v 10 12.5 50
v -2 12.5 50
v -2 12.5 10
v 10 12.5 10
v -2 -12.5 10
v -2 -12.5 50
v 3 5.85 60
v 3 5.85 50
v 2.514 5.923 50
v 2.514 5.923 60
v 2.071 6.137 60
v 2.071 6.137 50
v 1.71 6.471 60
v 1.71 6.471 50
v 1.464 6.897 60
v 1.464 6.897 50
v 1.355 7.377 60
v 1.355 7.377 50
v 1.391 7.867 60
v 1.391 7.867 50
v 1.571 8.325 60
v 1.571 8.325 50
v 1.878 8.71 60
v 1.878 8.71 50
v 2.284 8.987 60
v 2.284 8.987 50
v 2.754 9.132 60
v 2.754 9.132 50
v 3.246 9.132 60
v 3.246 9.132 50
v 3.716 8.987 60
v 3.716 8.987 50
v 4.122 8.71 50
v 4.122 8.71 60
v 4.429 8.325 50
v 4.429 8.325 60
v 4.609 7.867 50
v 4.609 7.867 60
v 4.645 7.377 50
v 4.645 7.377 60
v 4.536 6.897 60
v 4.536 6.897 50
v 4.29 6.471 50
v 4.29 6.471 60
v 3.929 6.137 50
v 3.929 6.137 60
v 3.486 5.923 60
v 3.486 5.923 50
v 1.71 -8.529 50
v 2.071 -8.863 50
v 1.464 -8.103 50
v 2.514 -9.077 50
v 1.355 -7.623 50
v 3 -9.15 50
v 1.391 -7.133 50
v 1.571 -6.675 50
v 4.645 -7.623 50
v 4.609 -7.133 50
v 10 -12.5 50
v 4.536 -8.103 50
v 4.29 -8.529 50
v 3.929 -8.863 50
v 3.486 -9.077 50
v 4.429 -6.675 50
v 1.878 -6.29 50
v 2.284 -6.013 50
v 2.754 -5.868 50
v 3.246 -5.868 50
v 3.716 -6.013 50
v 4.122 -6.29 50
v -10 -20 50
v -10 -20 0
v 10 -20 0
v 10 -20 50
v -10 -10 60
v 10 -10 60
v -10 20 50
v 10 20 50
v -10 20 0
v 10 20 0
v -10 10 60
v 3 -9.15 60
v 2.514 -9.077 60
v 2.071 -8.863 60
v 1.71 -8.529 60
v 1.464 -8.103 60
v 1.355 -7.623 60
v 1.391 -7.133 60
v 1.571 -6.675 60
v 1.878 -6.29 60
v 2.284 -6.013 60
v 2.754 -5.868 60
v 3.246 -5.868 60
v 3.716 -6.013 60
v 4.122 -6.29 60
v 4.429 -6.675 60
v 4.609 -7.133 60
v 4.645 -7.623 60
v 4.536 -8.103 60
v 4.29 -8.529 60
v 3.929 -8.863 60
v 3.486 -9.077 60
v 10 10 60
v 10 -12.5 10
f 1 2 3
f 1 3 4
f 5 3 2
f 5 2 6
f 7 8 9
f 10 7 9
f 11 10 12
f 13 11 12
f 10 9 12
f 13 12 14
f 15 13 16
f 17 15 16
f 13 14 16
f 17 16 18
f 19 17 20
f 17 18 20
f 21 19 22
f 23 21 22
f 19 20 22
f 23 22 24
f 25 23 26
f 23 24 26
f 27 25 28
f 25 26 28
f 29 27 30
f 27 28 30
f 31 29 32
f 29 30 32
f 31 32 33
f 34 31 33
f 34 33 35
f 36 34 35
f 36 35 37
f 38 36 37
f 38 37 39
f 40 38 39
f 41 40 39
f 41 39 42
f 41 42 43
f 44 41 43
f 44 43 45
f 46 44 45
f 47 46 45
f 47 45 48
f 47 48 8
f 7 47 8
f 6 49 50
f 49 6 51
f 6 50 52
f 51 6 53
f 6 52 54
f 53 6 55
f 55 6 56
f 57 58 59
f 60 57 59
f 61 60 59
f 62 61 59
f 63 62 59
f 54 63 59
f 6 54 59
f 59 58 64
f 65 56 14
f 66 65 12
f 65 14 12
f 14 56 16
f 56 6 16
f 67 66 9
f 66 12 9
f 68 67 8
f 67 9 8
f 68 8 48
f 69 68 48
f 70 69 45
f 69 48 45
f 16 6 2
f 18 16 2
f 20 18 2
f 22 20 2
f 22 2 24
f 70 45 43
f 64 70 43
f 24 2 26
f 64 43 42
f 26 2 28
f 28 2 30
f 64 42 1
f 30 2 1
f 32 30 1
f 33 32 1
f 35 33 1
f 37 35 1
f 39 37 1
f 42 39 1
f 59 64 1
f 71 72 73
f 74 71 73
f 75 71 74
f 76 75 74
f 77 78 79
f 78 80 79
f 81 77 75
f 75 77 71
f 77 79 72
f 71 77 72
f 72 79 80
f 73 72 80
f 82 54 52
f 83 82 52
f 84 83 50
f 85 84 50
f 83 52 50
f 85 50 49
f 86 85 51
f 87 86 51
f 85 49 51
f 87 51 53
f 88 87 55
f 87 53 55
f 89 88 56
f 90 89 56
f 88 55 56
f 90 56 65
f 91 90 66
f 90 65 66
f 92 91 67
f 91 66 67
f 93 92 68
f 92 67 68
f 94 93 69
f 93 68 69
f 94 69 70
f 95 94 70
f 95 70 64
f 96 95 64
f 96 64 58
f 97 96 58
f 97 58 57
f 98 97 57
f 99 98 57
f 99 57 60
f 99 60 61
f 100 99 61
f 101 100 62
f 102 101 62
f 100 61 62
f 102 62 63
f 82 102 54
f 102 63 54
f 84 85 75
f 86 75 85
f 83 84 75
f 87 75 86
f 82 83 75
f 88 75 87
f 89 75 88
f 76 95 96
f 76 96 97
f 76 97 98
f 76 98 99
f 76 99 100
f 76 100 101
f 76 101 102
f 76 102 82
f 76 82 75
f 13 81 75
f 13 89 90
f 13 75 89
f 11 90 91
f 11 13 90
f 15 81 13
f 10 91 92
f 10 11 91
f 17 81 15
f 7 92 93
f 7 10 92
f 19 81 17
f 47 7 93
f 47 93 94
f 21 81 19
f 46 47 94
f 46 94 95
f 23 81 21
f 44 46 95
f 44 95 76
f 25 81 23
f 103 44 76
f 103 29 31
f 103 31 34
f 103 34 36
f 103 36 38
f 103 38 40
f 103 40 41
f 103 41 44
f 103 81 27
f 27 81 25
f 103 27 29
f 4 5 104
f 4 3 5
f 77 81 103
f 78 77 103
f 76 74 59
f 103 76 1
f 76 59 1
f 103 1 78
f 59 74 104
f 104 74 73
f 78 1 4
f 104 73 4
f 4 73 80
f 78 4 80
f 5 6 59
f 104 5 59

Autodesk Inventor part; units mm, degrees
ref_plane "YZ Plane" through (0, 0, 0) normal (1, 0, 0) x (0, 1, 0)
ref_plane "XZ Plane" through (0, 0, 0) normal (0, 1, 0) x (-1, 0, 0)
ref_plane "XY Plane" through (0, 0, 0) normal (0, 0, 1) x (1, 0, 0)
sketch "スケッチ1" plane through (0, 0, 0) normal (0, 0, 1) x (1, 0, 0)
  line L0 (-10, -20) -> (10, -20)
  line L1 (10, -20) -> (10, 20)
  line L2 (10, 20) -> (-10, 20)
  line L3 (-10, 20) -> (-10, -20)
  line L4 (-10, -20) -> (10, 20) construction
  line L5 (10, -20) -> (-10, 20) construction
  point P0 (0, 0)
  dimension "d0" = 20
  dimension "d1" = 40
extrude "押し出し1" add sketch "スケッチ1" along normal blind 10
sketch "スケッチ2" plane through (0, 0, 10) normal (0, 0, 1) x (1, 0, 0)
  line L0 (-10, 20) -> (-10, -20) projected
  line L1 (-10, -20) -> (10, -20) projected
  line L2 (10, -20) -> (10, 20) projected
  line L3 (10, 20) -> (-10, 20) projected
  line L4 (10, 20) -> (-10, 20)
  line L5 (-10, 20) -> (-10, 12.5)
  line L6 (-10, 12.5) -> (10, 12.5)
  line L7 (10, 12.5) -> (10, 20)
  line L8 (10, -20) -> (-10, -20)
  line L9 (-10, -20) -> (-10, -12.5)
  line L10 (-10, -12.5) -> (10, -12.5)
  line L11 (10, -12.5) -> (10, -20)
  line L12 (-10, 20) -> (-2, 20)
  line L13 (-2, 20) -> (-2, -20)
  line L14 (-2, -20) -> (-10, -20)
  line L15 (-10, -20) -> (-10, 20)
  point P0 (0, 0)
  point P1 (10, -12.5)
  point P2 (-2, -12.5)
  point P3 (-2, 12.5)
  point P4 (10, 12.5)
  dimension "d4" = 7.5
  dimension "d5" = 7.5
  dimension "d6" = 8
extrude "押し出し2" add sketch "スケッチ2" along normal blind 40 contours L3 L13 L6 L0 | L6 L13 L10 L0 | L3 L2 L6 L13 | L10 L13 L1 L0 | L10 L2 L1 L13
sketch "スケッチ3" plane through (0, 0, 50) normal (0, 0, 1) x (1, 0, 0)
  line L0 (-10, -20) -> (10, -20) projected
  line L1 (10, -20) -> (10, -12.5) projected
  line L2 (10, 12.5) -> (10, 20) projected
  line L3 (10, 20) -> (-10, 20) projected
  line L4 (-10, 20) -> (-10, -20) projected
  line L5 (10, 12.5) -> (-2, 12.5) projected
  line L6 (-2, 12.5) -> (-2, -12.5) projected
  line L7 (-2, -12.5) -> (10, -12.5) projected
  line L8 (10, -12.5) -> (10, 12.5) projected
  point P0 (0, 0)
extrude "押し出し3" add sketch "スケッチ3" along normal blind 10
sketch "スケッチ4" plane through (0, 0, 60) normal (0, 0, 1) x (1, 0, 0)
  line L0 (10, -20) -> (10, 20) projected
  point P0 (0, 0)
  point P1 (3, 7.5)
  point P2 (3, -7.5)
  dimension "d11" = 7
  dimension "d12" = 15
  dimension "d13" = 7.5
hole "穴1" at (3, 7.5, 60) at (3, -7.5, 60) direction (0, 0, -1) diameter 3.3 depth 40.25
chamfer "面取り1" distance 10 angle 45 2 edges at (0, 20, 60) (0, -20, 60)
properties part number "Print_Parts_Q" material "PC/ABS プラスチック"
